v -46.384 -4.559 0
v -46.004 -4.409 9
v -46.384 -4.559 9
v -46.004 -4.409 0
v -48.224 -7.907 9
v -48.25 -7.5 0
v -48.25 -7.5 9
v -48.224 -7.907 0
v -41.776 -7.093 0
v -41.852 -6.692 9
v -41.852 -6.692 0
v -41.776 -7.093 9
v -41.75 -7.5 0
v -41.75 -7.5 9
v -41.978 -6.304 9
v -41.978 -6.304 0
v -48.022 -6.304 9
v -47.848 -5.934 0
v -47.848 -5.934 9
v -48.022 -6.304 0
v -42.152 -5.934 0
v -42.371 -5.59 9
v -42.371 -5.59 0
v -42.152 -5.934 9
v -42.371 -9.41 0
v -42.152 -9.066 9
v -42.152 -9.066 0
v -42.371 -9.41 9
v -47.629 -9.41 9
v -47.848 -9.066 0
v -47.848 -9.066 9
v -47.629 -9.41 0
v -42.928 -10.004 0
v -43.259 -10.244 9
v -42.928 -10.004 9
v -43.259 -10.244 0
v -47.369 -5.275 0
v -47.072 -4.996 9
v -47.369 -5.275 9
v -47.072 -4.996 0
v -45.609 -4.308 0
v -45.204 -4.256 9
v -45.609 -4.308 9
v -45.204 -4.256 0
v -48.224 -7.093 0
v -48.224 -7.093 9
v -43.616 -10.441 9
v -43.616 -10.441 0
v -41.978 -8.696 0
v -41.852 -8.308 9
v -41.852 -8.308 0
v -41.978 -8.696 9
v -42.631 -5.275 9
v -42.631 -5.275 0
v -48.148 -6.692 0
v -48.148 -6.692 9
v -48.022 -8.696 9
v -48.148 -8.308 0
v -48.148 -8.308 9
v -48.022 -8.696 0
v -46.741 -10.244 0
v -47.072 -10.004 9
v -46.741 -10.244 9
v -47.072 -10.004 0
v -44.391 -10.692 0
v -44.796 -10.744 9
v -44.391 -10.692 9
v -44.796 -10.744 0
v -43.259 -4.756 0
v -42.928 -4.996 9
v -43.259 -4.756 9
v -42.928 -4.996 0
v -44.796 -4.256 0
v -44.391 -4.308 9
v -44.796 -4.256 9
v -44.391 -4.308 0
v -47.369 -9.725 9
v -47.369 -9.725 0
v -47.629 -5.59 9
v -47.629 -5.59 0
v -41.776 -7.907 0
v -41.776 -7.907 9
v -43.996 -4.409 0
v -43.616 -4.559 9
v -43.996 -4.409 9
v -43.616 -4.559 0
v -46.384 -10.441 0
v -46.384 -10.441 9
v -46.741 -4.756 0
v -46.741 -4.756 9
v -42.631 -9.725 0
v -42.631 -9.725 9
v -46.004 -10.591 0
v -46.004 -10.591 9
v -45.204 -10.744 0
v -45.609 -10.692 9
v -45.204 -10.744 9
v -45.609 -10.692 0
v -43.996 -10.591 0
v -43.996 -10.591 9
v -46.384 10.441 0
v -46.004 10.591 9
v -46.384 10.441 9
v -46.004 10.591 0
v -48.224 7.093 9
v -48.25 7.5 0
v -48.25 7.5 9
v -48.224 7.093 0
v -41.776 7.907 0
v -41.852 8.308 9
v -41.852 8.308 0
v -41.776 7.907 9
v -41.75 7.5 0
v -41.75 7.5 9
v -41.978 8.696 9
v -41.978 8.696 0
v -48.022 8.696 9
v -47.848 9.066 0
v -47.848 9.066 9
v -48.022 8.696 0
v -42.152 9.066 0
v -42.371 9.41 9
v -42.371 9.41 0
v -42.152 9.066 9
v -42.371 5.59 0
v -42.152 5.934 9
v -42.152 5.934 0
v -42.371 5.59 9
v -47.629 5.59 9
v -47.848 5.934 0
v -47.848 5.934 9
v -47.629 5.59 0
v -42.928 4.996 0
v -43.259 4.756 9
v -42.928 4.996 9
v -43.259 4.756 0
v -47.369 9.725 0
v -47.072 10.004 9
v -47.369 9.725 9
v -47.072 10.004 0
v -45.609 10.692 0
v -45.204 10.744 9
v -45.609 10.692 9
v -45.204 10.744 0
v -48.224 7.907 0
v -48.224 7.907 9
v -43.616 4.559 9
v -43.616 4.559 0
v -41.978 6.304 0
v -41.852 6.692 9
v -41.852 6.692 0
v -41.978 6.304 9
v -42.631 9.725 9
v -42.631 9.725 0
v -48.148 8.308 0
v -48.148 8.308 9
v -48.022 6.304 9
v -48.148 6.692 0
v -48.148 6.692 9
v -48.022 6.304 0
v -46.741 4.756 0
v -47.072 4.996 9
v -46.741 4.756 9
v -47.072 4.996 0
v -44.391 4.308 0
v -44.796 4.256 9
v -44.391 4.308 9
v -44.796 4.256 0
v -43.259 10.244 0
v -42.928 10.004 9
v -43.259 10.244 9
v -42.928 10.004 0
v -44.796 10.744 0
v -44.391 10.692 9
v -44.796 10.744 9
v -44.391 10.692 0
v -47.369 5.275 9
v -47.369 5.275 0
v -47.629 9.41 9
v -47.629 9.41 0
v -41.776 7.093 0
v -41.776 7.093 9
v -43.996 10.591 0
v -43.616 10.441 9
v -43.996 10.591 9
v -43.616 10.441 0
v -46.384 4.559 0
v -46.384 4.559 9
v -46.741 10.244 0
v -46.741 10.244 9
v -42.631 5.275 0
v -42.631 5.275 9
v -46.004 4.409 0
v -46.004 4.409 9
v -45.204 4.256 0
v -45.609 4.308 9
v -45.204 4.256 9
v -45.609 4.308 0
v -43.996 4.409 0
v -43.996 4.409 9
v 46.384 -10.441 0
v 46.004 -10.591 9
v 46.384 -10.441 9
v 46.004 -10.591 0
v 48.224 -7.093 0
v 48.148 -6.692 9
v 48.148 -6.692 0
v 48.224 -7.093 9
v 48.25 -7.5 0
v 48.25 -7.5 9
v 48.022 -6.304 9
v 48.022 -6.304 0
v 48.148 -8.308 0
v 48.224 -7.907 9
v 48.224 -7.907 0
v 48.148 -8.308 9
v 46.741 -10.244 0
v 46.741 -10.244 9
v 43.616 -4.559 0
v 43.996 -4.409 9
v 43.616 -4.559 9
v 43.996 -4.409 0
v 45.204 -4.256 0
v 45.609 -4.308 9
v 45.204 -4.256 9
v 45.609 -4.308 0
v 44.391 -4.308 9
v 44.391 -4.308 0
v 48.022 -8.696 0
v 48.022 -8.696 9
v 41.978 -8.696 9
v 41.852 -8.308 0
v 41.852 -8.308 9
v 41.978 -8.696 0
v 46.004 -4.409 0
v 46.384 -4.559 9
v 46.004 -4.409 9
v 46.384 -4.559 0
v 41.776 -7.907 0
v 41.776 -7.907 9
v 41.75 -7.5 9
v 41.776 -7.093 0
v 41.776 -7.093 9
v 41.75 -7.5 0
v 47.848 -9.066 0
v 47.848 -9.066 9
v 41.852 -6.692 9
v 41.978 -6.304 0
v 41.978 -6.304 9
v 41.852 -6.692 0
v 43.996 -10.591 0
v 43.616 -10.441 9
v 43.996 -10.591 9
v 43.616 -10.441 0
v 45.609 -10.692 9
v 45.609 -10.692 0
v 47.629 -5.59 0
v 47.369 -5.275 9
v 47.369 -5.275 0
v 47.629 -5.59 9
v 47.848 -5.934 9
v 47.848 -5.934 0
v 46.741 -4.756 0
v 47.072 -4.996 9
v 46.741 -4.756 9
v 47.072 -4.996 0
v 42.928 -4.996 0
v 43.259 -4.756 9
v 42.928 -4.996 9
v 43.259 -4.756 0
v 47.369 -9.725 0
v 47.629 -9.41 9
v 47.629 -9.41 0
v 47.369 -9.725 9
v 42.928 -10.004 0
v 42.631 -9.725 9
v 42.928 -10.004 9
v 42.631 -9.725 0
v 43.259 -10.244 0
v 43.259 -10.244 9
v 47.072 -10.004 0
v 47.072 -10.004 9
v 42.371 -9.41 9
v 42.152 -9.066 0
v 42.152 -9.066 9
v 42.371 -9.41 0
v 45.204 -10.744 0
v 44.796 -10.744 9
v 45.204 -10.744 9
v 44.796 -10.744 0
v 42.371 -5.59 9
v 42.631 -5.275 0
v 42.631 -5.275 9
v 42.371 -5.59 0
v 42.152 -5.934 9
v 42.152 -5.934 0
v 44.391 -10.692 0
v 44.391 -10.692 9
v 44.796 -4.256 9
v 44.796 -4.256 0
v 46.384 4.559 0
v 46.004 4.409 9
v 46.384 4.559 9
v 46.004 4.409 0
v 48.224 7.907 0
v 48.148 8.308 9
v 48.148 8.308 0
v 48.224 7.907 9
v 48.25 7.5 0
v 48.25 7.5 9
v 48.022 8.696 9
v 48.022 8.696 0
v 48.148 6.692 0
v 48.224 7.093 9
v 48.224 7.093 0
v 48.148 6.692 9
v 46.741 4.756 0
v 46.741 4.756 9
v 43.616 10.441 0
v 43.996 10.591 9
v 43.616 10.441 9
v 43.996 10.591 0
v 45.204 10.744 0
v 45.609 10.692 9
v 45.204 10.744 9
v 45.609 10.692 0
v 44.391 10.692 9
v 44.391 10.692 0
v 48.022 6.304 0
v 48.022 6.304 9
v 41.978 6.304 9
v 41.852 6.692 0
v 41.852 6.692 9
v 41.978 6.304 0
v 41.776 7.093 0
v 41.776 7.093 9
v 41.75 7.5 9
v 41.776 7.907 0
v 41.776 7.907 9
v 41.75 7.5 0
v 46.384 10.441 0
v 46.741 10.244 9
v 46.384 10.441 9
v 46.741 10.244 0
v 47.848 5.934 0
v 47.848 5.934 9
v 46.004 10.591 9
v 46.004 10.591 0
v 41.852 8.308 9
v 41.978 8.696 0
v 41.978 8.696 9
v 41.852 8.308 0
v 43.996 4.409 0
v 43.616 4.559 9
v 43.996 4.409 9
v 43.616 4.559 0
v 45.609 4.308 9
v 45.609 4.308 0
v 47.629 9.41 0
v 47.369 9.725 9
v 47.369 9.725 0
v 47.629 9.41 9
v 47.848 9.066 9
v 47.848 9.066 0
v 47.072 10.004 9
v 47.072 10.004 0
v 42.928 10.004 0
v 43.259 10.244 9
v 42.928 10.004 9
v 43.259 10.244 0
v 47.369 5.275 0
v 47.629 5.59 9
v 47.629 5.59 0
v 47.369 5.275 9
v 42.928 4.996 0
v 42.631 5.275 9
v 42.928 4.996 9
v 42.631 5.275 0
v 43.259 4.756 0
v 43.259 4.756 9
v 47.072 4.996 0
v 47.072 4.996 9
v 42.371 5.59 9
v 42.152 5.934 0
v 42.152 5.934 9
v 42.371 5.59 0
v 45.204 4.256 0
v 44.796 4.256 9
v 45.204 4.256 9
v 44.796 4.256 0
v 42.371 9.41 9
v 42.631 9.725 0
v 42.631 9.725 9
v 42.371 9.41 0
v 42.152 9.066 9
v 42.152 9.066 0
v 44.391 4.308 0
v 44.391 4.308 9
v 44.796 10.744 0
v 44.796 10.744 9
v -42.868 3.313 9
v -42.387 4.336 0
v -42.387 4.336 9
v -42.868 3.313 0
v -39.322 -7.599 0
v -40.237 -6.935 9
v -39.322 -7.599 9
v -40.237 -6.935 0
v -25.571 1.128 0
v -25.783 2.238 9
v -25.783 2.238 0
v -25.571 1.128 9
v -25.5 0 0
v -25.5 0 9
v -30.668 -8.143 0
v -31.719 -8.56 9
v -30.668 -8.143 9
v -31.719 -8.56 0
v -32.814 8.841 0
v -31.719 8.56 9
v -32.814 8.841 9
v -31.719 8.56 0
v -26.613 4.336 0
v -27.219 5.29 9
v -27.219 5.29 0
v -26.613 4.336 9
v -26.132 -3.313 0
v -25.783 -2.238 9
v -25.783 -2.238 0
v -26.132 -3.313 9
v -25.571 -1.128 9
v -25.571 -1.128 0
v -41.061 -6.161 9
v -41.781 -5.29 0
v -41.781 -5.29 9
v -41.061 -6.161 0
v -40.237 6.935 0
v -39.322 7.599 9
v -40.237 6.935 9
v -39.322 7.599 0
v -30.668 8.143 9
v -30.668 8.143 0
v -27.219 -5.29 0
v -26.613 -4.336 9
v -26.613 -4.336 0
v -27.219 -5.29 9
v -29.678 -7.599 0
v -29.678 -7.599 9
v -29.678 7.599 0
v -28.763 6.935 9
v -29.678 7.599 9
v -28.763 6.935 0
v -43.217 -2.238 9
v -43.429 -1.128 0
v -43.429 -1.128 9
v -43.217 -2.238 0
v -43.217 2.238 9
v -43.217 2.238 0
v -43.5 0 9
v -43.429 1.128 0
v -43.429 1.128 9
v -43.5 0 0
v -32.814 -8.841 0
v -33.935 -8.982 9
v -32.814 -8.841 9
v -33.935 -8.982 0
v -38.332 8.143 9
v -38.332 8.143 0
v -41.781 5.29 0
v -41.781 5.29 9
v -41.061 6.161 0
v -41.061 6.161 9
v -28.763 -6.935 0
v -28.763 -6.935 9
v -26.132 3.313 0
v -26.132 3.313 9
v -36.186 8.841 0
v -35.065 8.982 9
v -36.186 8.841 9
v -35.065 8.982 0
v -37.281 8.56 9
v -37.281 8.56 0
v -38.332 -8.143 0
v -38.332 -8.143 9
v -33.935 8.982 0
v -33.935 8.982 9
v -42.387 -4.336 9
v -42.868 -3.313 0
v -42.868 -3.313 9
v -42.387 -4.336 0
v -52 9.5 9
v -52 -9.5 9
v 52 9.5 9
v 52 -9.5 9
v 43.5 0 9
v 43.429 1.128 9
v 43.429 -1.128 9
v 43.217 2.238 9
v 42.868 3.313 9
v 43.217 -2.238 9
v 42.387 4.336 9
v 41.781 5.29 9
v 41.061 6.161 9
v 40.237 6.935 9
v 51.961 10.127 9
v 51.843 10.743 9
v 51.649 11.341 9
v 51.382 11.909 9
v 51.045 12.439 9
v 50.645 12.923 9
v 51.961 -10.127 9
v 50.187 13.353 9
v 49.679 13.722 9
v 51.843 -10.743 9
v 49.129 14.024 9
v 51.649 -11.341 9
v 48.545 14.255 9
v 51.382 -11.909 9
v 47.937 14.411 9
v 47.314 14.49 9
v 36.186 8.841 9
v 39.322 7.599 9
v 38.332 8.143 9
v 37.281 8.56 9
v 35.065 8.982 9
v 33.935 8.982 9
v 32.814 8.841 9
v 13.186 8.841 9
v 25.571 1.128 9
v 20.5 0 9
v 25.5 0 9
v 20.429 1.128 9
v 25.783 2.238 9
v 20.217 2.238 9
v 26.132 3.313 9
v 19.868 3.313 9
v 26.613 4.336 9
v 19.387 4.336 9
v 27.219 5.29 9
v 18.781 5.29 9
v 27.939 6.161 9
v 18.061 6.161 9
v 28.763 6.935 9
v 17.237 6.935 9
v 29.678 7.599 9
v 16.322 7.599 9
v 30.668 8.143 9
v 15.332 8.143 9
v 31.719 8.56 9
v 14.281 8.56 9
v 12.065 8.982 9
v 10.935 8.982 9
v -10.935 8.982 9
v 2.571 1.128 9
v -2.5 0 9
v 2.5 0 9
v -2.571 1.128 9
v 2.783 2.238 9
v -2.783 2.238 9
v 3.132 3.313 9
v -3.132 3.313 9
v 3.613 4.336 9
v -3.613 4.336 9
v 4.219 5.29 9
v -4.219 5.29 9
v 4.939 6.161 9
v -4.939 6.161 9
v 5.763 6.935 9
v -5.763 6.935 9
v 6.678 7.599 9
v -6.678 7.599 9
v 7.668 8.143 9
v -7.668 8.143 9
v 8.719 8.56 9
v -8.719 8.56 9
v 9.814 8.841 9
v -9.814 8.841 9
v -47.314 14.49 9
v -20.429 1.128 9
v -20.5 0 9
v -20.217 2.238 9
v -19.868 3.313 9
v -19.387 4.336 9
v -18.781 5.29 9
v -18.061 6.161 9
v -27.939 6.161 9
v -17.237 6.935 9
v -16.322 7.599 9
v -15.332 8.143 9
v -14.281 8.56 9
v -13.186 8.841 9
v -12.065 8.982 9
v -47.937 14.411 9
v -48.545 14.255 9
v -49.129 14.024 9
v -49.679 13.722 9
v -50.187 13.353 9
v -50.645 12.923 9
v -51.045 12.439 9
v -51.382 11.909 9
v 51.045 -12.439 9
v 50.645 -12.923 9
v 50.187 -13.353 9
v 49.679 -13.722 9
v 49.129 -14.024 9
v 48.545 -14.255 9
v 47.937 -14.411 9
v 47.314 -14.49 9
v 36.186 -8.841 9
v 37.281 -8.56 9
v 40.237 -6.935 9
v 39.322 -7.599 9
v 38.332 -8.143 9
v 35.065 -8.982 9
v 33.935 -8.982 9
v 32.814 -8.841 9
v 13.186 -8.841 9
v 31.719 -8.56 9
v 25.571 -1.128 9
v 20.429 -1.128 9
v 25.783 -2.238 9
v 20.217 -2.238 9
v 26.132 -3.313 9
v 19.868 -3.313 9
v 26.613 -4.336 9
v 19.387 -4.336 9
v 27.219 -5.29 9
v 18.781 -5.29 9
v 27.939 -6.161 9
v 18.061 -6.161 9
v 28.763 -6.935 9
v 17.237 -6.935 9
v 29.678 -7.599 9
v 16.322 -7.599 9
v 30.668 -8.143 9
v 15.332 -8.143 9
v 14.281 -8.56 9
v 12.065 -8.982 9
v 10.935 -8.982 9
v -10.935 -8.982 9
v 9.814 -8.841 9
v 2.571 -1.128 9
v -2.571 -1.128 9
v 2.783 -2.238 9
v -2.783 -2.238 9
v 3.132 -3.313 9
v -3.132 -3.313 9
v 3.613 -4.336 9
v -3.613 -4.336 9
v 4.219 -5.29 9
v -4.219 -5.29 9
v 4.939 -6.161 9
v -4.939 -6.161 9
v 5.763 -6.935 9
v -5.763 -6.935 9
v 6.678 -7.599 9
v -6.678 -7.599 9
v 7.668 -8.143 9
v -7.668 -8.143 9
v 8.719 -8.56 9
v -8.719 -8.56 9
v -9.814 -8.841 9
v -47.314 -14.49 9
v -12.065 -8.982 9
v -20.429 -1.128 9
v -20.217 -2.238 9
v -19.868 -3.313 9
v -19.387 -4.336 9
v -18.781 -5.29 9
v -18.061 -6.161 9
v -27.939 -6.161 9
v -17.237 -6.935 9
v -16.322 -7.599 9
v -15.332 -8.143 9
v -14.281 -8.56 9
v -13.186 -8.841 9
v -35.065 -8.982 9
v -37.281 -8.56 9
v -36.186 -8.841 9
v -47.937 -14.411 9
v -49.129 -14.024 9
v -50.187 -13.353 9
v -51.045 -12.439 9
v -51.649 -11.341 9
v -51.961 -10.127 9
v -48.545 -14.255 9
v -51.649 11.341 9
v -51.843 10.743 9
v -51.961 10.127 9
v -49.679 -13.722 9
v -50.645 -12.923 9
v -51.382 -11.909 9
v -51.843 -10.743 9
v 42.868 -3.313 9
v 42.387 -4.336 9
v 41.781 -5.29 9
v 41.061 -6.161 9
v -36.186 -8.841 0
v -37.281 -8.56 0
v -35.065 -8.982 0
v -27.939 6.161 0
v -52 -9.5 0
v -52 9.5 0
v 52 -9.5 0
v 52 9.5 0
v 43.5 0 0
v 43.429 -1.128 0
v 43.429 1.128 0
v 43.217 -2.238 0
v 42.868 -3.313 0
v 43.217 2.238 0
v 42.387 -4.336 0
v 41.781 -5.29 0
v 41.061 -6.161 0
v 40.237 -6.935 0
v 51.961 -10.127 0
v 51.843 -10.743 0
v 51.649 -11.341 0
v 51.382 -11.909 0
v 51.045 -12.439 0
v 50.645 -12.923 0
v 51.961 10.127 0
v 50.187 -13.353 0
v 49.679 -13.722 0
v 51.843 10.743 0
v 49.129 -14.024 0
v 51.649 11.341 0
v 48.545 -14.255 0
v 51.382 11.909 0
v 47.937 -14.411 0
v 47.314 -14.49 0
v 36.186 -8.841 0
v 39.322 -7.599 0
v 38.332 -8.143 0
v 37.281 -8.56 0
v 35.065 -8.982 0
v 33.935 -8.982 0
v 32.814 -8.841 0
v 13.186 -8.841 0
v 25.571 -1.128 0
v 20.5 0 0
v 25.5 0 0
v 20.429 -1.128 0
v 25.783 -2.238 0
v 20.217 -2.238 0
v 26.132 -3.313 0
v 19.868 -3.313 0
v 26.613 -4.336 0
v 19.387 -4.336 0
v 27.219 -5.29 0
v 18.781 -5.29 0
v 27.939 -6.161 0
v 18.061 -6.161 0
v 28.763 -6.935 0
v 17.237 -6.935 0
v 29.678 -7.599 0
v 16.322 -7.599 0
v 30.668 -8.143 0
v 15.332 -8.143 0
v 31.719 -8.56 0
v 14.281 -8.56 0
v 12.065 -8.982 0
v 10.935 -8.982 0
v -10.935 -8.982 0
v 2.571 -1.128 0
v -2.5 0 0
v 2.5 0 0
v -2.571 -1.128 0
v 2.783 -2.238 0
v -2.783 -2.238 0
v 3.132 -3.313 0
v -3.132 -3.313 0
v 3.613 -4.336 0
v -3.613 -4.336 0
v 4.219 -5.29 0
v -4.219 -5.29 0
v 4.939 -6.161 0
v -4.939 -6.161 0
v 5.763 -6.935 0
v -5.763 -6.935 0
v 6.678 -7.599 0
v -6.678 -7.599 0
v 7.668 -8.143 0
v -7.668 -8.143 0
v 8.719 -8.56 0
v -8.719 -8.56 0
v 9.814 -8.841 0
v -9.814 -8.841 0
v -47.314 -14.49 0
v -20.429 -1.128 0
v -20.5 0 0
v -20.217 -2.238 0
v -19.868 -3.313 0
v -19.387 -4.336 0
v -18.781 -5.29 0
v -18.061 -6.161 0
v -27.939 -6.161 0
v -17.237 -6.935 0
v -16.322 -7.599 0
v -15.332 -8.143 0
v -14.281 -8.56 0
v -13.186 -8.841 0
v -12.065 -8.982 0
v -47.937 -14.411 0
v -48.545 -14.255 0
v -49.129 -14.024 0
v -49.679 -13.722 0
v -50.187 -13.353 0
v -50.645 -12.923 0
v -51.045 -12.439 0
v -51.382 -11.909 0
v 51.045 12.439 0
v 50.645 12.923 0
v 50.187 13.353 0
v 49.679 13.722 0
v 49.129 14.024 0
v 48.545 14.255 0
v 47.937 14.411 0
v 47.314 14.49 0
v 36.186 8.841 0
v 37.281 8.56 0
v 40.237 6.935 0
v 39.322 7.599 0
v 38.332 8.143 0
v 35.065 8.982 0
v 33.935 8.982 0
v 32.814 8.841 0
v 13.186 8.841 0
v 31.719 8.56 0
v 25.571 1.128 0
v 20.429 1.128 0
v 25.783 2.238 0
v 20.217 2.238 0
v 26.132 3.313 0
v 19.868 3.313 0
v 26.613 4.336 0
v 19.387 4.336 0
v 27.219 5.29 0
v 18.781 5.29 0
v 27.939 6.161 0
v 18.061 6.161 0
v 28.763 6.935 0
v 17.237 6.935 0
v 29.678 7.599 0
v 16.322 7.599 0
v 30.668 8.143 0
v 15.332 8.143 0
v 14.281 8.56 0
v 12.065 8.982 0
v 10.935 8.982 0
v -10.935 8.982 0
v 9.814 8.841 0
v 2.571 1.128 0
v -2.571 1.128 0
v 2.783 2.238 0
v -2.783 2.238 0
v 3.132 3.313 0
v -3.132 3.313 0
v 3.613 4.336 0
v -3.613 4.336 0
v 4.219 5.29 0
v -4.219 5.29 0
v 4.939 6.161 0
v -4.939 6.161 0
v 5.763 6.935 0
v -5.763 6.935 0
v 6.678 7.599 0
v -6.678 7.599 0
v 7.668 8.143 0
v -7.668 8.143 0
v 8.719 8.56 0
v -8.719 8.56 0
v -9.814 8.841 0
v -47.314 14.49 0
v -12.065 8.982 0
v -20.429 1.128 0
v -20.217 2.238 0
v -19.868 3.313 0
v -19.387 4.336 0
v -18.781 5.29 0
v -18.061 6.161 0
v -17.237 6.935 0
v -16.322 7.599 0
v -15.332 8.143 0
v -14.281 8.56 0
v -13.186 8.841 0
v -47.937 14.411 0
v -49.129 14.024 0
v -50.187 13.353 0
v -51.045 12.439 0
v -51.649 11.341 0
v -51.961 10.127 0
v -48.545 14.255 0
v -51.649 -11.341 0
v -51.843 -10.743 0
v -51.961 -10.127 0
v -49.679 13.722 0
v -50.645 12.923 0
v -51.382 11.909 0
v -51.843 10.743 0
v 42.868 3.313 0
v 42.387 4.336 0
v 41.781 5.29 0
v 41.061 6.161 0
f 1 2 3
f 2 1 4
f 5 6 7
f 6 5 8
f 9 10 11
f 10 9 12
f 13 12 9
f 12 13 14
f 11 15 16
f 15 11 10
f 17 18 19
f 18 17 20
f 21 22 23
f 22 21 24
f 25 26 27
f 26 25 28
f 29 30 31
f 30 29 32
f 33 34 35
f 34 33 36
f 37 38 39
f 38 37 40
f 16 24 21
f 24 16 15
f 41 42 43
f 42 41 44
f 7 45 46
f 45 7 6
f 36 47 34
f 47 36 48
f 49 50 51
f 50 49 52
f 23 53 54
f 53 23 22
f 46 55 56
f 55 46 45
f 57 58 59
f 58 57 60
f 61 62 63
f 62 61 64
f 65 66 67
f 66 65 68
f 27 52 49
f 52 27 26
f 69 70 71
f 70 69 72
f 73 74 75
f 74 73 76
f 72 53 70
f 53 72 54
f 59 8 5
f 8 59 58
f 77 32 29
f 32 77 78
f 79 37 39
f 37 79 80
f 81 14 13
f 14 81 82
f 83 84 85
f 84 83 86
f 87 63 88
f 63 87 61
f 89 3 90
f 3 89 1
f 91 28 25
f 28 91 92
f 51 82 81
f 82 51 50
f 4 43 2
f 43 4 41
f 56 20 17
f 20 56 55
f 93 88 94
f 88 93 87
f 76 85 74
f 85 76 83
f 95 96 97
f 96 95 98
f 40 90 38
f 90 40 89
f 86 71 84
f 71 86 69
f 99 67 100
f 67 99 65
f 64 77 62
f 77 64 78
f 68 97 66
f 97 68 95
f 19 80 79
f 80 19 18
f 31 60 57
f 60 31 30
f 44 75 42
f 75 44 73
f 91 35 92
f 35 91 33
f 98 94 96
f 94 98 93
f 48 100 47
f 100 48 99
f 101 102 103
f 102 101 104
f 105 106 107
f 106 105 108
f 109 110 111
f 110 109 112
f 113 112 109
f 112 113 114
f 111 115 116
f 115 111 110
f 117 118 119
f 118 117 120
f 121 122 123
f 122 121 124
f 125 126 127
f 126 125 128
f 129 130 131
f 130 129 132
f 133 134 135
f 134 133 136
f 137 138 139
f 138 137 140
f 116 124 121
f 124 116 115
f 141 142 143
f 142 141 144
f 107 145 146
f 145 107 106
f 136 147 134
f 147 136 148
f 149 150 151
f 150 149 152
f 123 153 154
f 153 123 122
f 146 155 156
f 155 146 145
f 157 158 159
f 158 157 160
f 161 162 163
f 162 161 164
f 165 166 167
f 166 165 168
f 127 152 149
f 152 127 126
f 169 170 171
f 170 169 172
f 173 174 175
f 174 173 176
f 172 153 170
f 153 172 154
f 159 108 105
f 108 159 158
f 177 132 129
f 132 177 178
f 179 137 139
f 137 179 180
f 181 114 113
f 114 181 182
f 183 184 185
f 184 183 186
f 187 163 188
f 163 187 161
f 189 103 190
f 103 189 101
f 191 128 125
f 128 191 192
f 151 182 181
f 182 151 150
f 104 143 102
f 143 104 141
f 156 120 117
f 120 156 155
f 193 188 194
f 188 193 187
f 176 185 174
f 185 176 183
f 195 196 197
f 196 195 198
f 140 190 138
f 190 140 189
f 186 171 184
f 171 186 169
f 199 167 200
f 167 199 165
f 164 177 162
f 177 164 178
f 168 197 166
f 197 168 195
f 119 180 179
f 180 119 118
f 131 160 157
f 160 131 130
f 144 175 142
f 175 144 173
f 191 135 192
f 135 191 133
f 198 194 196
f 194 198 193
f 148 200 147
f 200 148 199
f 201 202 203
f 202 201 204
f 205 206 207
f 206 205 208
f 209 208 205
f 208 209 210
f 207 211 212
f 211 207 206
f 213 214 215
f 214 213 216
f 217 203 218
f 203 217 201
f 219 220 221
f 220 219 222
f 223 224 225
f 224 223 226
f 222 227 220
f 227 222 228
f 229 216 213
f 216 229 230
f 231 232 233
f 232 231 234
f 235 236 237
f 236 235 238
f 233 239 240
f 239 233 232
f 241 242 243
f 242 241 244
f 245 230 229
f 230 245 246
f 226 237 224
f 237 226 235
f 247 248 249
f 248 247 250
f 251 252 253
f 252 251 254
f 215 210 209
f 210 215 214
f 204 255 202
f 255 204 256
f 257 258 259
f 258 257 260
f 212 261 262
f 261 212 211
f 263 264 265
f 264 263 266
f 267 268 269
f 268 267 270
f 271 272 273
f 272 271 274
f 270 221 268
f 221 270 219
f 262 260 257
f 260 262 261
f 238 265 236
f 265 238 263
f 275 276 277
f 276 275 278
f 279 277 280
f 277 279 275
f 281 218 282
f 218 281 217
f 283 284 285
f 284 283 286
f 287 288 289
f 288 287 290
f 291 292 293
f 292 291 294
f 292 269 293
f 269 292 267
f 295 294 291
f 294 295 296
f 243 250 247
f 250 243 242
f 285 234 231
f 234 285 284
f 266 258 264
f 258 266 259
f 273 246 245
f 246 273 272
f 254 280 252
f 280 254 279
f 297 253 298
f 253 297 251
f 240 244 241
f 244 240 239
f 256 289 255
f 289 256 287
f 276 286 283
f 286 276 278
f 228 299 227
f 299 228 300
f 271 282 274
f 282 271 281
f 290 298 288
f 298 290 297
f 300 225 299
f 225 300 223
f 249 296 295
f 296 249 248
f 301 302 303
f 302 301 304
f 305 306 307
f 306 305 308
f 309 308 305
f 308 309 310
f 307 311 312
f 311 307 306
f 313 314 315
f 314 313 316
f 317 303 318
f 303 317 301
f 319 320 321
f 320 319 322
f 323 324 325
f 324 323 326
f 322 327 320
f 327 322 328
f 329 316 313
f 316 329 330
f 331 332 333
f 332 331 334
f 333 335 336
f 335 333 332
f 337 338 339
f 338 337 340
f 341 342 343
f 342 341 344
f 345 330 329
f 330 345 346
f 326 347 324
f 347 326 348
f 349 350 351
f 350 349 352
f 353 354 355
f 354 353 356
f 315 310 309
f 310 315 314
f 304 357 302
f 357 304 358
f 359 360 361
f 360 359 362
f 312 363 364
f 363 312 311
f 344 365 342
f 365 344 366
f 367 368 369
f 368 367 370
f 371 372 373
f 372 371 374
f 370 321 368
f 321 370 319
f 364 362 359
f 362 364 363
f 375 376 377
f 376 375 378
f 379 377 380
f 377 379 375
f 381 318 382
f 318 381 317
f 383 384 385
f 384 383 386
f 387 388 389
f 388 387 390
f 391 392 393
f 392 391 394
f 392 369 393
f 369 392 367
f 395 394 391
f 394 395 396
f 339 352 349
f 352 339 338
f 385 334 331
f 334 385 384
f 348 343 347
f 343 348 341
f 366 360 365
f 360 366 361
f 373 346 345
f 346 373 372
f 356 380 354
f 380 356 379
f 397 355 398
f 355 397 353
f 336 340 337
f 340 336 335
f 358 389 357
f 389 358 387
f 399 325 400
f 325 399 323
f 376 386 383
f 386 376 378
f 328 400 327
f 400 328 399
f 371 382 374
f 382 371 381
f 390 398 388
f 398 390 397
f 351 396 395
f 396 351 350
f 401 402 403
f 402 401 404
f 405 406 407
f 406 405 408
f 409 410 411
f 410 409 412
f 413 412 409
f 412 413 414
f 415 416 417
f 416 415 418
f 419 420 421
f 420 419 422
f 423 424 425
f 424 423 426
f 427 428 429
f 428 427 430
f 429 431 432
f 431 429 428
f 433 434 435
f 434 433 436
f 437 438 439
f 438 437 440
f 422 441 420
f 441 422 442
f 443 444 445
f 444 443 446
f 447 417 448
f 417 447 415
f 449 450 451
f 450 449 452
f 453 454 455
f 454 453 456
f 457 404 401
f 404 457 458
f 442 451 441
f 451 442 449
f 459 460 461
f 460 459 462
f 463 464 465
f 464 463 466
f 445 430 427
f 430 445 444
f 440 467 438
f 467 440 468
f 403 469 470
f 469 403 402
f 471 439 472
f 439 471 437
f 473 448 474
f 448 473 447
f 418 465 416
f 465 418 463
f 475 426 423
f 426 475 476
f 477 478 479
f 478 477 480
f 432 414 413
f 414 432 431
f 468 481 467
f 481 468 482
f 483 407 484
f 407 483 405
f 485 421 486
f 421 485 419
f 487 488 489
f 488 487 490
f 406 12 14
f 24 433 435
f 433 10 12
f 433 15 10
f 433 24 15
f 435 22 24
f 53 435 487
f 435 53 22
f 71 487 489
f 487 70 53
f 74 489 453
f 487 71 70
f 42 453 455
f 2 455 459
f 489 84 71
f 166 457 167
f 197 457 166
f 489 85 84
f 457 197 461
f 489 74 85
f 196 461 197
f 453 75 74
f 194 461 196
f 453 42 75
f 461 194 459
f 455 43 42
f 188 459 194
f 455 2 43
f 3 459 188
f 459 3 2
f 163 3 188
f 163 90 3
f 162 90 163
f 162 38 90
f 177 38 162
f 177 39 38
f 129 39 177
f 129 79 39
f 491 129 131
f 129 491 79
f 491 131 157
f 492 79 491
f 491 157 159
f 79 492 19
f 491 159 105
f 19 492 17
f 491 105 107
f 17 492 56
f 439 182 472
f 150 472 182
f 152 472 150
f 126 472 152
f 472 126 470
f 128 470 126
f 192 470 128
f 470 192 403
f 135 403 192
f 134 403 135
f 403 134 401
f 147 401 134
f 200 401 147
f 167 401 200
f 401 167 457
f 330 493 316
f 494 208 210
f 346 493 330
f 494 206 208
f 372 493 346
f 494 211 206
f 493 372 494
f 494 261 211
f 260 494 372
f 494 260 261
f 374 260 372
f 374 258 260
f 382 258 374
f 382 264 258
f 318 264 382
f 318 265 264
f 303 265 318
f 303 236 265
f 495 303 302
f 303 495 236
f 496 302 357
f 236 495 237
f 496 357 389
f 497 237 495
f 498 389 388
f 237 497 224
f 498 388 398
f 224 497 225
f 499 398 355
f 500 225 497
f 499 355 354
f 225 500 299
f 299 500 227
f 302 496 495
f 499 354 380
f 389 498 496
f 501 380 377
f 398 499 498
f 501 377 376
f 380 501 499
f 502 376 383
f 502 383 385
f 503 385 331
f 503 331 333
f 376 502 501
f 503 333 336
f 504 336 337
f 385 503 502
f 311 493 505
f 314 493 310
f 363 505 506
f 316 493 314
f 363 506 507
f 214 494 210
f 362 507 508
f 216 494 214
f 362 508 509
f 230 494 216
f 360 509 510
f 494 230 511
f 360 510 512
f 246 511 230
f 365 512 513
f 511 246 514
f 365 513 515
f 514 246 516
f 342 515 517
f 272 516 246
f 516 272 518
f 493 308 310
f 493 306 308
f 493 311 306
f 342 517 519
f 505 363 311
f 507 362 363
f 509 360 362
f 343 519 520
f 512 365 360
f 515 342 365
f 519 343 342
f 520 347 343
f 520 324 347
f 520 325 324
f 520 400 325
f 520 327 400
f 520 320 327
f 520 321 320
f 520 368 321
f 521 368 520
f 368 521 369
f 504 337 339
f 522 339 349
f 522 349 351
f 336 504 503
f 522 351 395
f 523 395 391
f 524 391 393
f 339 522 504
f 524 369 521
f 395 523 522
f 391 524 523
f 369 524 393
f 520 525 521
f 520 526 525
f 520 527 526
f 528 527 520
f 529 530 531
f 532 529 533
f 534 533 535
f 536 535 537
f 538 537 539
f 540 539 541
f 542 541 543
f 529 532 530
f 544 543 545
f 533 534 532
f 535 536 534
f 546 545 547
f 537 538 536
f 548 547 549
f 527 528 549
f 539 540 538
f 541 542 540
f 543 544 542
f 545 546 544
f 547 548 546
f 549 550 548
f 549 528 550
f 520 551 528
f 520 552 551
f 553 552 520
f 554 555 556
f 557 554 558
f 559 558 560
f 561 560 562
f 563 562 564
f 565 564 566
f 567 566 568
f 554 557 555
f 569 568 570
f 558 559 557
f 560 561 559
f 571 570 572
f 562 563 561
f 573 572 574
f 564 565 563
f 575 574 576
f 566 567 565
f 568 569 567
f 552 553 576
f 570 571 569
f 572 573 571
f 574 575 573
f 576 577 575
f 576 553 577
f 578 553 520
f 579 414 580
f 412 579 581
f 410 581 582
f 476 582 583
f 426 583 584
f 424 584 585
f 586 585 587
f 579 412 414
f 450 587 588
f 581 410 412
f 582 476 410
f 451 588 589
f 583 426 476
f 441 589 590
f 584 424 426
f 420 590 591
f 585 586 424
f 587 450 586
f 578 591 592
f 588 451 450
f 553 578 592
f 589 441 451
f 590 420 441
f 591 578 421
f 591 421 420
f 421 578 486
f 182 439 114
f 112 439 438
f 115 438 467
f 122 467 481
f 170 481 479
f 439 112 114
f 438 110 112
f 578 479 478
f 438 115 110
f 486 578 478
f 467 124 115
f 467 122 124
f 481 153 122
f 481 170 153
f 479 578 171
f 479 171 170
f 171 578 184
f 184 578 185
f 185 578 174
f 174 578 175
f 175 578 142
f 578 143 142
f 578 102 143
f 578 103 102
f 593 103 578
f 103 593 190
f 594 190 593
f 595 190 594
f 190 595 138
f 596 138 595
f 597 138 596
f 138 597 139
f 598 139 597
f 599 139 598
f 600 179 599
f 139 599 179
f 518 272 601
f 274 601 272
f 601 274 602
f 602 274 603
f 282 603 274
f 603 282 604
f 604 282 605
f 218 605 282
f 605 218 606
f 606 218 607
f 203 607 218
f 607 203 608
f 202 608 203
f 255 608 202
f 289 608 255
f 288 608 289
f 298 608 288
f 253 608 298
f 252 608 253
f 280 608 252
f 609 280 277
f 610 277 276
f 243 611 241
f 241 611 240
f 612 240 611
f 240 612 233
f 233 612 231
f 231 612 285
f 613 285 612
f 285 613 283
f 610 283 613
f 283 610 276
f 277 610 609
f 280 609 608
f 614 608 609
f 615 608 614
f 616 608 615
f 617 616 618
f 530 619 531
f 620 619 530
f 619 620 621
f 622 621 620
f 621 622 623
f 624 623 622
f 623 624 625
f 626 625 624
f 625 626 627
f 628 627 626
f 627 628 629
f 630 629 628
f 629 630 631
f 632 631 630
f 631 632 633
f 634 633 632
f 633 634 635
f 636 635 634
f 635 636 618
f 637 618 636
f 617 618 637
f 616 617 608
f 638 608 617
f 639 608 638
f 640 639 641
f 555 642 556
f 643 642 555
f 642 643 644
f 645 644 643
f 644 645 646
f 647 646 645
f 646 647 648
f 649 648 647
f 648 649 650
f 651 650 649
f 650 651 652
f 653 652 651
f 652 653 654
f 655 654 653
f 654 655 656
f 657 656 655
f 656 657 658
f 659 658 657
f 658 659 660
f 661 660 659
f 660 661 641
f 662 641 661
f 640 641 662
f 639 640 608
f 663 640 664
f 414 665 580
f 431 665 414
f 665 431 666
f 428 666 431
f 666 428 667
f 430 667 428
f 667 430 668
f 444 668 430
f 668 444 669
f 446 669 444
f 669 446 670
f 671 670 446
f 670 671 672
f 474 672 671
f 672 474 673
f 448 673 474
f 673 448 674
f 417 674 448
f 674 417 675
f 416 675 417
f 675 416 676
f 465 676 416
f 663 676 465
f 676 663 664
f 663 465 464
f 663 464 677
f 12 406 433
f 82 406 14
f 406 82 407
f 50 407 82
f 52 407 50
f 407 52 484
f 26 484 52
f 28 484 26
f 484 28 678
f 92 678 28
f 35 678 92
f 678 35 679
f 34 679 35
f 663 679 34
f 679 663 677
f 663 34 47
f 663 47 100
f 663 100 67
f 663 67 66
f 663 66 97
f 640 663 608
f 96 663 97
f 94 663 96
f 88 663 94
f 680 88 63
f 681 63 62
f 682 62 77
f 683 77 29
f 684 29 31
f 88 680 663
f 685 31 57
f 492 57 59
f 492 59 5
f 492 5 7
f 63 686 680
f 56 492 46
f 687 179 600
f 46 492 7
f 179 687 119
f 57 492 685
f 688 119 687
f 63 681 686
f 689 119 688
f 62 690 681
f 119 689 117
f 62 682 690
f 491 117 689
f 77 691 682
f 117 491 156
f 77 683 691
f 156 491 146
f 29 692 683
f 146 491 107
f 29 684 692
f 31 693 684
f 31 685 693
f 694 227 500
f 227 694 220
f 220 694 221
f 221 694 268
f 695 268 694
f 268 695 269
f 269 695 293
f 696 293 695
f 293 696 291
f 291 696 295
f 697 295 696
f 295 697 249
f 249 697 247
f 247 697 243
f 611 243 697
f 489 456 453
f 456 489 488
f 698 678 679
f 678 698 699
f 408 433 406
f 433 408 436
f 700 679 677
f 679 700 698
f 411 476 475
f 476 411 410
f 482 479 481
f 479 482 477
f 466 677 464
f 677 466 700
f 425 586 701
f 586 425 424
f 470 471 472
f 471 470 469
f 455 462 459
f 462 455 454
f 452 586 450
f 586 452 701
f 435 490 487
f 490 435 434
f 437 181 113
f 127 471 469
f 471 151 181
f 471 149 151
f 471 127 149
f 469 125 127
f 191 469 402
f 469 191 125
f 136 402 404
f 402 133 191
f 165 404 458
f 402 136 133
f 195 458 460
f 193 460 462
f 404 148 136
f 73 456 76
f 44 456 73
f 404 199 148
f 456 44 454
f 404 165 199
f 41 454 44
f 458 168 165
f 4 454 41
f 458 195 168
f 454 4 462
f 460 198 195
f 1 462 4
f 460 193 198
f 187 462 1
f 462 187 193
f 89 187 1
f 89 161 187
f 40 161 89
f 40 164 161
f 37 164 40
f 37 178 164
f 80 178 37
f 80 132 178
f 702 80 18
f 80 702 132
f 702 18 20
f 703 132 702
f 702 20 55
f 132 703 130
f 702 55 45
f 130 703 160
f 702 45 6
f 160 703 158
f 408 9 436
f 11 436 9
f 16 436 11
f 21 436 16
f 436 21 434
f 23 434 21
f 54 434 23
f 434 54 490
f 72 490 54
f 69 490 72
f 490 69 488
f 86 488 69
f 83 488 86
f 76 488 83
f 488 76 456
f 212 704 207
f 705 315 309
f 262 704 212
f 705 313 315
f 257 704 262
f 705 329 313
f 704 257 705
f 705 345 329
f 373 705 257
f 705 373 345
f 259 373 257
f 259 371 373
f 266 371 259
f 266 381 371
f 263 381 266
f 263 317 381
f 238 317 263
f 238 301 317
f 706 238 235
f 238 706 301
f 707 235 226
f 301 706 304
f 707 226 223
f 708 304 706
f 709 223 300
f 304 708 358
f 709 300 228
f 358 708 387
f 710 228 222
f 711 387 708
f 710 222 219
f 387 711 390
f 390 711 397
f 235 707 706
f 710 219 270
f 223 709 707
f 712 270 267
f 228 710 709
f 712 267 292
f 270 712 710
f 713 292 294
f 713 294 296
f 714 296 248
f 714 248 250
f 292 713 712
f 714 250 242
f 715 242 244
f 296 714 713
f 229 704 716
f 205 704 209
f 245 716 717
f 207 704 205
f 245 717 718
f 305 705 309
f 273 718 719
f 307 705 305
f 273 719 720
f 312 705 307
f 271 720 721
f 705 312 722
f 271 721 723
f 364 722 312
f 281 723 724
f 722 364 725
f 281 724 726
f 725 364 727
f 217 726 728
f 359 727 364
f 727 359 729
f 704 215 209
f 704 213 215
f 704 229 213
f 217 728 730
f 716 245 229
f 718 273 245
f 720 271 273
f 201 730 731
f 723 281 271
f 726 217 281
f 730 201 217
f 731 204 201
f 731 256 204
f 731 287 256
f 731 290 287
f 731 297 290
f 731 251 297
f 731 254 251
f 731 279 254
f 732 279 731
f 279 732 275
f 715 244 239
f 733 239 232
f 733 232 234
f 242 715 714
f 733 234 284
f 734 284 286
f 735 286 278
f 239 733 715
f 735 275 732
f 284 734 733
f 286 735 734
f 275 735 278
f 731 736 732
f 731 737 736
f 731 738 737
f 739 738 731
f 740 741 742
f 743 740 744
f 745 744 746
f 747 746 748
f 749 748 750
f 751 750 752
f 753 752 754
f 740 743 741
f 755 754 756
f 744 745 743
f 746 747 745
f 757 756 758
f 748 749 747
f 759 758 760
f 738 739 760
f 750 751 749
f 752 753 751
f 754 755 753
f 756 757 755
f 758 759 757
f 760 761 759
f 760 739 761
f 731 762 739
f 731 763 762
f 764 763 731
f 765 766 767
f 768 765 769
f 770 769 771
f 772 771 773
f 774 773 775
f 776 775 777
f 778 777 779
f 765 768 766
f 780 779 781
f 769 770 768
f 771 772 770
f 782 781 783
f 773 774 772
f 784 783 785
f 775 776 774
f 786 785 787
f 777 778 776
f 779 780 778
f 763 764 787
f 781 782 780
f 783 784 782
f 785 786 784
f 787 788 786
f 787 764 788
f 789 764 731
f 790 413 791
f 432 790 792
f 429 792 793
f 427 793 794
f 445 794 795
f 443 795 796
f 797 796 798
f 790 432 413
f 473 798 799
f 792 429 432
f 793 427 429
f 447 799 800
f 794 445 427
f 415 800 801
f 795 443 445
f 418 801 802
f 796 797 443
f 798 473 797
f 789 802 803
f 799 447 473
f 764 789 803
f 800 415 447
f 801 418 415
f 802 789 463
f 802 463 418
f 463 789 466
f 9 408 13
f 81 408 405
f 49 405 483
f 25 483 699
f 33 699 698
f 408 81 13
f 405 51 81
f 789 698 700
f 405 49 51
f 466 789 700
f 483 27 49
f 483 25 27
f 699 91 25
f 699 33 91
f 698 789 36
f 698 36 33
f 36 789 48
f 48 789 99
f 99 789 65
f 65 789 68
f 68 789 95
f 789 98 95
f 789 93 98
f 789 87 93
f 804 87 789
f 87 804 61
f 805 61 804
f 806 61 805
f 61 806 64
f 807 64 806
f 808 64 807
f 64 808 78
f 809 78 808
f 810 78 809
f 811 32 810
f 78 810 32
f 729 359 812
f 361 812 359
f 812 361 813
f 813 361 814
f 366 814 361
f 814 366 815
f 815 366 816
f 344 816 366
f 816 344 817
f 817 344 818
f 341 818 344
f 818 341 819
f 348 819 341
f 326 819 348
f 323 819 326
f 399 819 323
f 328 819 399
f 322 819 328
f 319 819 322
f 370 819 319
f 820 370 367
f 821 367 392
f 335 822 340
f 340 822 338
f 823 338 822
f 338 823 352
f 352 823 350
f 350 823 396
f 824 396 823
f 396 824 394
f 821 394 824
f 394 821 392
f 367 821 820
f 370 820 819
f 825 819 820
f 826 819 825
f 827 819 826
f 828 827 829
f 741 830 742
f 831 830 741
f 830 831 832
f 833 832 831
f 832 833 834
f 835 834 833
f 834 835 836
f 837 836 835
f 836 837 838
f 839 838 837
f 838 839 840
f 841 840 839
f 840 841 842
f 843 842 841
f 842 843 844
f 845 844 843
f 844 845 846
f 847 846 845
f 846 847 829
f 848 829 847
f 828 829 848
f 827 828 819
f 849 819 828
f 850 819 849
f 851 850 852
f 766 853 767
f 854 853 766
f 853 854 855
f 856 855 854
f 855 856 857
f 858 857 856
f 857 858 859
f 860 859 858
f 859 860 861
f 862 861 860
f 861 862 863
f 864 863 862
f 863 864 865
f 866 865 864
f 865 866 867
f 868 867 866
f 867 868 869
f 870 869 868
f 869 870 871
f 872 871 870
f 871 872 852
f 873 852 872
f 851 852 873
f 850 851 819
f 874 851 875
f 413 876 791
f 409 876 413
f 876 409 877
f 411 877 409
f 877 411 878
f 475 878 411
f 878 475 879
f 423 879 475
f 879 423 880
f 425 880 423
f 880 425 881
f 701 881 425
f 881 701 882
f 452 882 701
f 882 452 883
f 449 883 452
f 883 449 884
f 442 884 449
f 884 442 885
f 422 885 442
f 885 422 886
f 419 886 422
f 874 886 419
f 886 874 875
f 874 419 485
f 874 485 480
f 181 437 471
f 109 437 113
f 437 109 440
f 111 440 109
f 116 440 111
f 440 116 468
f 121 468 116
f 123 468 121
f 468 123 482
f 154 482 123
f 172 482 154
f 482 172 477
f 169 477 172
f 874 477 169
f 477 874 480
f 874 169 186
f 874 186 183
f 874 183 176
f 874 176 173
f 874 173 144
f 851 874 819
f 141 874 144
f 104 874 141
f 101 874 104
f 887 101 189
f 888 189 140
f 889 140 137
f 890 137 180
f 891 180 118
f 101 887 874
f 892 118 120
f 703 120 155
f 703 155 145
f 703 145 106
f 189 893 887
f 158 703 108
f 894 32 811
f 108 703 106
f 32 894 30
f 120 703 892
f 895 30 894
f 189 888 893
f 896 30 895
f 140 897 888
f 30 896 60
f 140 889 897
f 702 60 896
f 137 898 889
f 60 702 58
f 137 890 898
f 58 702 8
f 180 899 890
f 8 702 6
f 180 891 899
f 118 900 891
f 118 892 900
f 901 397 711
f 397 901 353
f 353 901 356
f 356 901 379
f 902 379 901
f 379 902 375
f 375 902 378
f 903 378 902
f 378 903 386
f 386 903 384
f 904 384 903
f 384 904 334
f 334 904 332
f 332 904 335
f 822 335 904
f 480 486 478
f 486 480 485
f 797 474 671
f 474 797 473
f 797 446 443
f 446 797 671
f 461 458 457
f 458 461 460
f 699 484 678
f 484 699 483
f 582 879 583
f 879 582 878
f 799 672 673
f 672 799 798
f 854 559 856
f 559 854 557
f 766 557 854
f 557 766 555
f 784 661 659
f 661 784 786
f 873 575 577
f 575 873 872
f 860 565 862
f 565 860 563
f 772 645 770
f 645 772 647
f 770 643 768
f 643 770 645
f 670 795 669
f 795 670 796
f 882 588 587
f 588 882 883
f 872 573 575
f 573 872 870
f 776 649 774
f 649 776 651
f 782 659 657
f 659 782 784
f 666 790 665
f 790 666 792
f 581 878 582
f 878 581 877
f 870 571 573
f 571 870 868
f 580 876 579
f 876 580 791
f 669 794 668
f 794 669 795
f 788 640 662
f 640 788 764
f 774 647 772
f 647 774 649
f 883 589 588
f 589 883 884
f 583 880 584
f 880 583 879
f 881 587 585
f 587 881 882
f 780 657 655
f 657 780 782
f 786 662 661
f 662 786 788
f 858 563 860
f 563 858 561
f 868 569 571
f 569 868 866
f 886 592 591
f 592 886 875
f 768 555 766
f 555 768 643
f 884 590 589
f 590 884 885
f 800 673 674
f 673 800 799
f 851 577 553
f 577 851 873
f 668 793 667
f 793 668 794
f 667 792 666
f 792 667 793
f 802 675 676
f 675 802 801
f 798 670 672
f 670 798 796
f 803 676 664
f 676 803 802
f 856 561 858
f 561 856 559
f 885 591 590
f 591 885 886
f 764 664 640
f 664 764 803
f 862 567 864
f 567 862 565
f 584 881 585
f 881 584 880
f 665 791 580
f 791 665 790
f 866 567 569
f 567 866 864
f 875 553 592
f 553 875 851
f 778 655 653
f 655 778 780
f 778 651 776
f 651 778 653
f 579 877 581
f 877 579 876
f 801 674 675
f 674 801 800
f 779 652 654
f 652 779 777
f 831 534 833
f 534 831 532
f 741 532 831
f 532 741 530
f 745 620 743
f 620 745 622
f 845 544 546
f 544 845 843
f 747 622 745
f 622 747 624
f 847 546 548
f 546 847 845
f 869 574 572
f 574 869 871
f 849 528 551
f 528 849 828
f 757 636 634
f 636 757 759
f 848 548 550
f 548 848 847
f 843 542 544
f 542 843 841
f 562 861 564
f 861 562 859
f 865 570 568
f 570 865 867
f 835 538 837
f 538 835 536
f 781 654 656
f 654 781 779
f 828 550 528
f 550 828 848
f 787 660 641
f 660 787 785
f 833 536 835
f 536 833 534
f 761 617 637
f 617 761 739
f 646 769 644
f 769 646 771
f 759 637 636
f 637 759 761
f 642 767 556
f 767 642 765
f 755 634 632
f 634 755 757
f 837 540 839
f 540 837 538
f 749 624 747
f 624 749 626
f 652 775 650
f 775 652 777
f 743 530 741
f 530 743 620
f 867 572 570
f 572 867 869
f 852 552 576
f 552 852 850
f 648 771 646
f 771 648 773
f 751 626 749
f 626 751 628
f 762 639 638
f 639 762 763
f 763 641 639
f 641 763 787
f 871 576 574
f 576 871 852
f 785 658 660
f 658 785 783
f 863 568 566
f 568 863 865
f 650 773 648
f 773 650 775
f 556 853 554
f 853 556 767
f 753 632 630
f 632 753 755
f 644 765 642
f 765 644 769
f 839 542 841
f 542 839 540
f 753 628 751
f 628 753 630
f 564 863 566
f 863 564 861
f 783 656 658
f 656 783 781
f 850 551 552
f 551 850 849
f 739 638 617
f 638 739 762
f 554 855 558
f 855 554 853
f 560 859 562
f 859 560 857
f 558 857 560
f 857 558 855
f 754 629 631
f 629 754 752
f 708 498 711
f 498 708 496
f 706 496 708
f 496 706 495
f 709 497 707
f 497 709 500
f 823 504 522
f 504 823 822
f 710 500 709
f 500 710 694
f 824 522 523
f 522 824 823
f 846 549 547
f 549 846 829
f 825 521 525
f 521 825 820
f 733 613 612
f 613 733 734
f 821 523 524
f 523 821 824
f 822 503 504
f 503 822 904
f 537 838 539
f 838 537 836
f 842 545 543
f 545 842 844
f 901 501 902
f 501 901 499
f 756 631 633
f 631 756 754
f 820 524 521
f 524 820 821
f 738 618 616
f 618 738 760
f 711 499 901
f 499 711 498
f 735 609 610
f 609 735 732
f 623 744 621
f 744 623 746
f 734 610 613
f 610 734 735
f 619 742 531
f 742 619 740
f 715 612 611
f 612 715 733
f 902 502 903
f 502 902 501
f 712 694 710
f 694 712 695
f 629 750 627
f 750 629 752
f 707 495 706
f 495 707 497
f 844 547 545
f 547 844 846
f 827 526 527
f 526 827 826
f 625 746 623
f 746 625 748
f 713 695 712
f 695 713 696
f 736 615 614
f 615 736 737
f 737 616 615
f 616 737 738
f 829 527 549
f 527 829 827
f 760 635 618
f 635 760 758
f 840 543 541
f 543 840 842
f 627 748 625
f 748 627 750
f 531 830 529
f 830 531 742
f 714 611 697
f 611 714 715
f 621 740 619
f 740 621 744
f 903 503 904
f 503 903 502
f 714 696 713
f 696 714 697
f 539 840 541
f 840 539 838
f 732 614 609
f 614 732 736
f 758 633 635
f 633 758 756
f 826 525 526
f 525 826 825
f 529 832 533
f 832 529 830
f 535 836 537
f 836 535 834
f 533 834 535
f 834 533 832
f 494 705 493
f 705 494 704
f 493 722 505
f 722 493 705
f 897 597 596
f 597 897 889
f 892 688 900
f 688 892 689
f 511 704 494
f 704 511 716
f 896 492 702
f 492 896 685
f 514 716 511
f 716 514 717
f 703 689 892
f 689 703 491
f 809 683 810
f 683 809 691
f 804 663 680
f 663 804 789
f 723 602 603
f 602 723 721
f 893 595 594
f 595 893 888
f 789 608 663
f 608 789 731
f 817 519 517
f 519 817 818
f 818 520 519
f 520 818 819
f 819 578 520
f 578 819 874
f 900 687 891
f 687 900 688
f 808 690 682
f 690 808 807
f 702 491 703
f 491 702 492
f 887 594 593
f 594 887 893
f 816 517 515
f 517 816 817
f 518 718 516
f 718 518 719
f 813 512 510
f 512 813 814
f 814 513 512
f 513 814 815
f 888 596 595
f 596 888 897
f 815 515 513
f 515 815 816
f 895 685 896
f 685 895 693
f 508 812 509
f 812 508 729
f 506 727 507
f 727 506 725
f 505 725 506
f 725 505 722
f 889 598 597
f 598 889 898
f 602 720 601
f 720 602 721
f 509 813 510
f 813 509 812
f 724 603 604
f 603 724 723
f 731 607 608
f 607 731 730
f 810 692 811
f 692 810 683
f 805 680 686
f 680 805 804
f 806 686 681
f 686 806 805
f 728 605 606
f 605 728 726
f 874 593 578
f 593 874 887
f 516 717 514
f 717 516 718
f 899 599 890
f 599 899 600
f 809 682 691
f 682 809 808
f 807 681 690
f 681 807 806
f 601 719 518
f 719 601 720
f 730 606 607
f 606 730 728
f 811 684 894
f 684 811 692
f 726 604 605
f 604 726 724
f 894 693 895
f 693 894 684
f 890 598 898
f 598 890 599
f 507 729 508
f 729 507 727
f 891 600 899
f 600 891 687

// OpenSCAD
$fn = 50;

difference() {
	union() {
		hull() {
			translate(v = [-47.0, 9.5, 0]) {
				cylinder(h = 9, r = 5);
			}
			translate(v = [47.0, 9.5, 0]) {
				cylinder(h = 9, r = 5);
			}
			translate(v = [-47.0, -9.5, 0]) {
				cylinder(h = 9, r = 5);
			}
			translate(v = [47.0, -9.5, 0]) {
				cylinder(h = 9, r = 5);
			}
		}
	}
	union() {
		translate(v = [-45.0, -7.5, -100.0]) {
			cylinder(h = 200, r = 3.25);
		}
		translate(v = [-45.0, 7.5, -100.0]) {
			cylinder(h = 200, r = 3.25);
		}
		translate(v = [45.0, -7.5, -100.0]) {
			cylinder(h = 200, r = 3.25);
		}
		translate(v = [45.0, 7.5, -100.0]) {
			cylinder(h = 200, r = 3.25);
		}
		translate(v = [-45.0, -7.5, -100.0]) {
			cylinder(h = 200, r = 1.8);
		}
		translate(v = [-45.0, 7.5, -100.0]) {
			cylinder(h = 200, r = 1.8);
		}
		translate(v = [45.0, -7.5, -100.0]) {
			cylinder(h = 200, r = 1.8);
		}
		translate(v = [45.0, 7.5, -100.0]) {
			cylinder(h = 200, r = 1.8);
		}
		translate(v = [-34.5, 0, 0.0]) {
			cylinder(h = 9, r = 9.0);
		}
		translate(v = [-11.5, 0, 0.0]) {
			cylinder(h = 9, r = 9.0);
		}
		translate(v = [11.5, 0, 0.0]) {
			cylinder(h = 9, r = 9.0);
		}
		translate(v = [34.5, 0, 0.0]) {
			cylinder(h = 9, r = 9.0);
		}
	}
}
